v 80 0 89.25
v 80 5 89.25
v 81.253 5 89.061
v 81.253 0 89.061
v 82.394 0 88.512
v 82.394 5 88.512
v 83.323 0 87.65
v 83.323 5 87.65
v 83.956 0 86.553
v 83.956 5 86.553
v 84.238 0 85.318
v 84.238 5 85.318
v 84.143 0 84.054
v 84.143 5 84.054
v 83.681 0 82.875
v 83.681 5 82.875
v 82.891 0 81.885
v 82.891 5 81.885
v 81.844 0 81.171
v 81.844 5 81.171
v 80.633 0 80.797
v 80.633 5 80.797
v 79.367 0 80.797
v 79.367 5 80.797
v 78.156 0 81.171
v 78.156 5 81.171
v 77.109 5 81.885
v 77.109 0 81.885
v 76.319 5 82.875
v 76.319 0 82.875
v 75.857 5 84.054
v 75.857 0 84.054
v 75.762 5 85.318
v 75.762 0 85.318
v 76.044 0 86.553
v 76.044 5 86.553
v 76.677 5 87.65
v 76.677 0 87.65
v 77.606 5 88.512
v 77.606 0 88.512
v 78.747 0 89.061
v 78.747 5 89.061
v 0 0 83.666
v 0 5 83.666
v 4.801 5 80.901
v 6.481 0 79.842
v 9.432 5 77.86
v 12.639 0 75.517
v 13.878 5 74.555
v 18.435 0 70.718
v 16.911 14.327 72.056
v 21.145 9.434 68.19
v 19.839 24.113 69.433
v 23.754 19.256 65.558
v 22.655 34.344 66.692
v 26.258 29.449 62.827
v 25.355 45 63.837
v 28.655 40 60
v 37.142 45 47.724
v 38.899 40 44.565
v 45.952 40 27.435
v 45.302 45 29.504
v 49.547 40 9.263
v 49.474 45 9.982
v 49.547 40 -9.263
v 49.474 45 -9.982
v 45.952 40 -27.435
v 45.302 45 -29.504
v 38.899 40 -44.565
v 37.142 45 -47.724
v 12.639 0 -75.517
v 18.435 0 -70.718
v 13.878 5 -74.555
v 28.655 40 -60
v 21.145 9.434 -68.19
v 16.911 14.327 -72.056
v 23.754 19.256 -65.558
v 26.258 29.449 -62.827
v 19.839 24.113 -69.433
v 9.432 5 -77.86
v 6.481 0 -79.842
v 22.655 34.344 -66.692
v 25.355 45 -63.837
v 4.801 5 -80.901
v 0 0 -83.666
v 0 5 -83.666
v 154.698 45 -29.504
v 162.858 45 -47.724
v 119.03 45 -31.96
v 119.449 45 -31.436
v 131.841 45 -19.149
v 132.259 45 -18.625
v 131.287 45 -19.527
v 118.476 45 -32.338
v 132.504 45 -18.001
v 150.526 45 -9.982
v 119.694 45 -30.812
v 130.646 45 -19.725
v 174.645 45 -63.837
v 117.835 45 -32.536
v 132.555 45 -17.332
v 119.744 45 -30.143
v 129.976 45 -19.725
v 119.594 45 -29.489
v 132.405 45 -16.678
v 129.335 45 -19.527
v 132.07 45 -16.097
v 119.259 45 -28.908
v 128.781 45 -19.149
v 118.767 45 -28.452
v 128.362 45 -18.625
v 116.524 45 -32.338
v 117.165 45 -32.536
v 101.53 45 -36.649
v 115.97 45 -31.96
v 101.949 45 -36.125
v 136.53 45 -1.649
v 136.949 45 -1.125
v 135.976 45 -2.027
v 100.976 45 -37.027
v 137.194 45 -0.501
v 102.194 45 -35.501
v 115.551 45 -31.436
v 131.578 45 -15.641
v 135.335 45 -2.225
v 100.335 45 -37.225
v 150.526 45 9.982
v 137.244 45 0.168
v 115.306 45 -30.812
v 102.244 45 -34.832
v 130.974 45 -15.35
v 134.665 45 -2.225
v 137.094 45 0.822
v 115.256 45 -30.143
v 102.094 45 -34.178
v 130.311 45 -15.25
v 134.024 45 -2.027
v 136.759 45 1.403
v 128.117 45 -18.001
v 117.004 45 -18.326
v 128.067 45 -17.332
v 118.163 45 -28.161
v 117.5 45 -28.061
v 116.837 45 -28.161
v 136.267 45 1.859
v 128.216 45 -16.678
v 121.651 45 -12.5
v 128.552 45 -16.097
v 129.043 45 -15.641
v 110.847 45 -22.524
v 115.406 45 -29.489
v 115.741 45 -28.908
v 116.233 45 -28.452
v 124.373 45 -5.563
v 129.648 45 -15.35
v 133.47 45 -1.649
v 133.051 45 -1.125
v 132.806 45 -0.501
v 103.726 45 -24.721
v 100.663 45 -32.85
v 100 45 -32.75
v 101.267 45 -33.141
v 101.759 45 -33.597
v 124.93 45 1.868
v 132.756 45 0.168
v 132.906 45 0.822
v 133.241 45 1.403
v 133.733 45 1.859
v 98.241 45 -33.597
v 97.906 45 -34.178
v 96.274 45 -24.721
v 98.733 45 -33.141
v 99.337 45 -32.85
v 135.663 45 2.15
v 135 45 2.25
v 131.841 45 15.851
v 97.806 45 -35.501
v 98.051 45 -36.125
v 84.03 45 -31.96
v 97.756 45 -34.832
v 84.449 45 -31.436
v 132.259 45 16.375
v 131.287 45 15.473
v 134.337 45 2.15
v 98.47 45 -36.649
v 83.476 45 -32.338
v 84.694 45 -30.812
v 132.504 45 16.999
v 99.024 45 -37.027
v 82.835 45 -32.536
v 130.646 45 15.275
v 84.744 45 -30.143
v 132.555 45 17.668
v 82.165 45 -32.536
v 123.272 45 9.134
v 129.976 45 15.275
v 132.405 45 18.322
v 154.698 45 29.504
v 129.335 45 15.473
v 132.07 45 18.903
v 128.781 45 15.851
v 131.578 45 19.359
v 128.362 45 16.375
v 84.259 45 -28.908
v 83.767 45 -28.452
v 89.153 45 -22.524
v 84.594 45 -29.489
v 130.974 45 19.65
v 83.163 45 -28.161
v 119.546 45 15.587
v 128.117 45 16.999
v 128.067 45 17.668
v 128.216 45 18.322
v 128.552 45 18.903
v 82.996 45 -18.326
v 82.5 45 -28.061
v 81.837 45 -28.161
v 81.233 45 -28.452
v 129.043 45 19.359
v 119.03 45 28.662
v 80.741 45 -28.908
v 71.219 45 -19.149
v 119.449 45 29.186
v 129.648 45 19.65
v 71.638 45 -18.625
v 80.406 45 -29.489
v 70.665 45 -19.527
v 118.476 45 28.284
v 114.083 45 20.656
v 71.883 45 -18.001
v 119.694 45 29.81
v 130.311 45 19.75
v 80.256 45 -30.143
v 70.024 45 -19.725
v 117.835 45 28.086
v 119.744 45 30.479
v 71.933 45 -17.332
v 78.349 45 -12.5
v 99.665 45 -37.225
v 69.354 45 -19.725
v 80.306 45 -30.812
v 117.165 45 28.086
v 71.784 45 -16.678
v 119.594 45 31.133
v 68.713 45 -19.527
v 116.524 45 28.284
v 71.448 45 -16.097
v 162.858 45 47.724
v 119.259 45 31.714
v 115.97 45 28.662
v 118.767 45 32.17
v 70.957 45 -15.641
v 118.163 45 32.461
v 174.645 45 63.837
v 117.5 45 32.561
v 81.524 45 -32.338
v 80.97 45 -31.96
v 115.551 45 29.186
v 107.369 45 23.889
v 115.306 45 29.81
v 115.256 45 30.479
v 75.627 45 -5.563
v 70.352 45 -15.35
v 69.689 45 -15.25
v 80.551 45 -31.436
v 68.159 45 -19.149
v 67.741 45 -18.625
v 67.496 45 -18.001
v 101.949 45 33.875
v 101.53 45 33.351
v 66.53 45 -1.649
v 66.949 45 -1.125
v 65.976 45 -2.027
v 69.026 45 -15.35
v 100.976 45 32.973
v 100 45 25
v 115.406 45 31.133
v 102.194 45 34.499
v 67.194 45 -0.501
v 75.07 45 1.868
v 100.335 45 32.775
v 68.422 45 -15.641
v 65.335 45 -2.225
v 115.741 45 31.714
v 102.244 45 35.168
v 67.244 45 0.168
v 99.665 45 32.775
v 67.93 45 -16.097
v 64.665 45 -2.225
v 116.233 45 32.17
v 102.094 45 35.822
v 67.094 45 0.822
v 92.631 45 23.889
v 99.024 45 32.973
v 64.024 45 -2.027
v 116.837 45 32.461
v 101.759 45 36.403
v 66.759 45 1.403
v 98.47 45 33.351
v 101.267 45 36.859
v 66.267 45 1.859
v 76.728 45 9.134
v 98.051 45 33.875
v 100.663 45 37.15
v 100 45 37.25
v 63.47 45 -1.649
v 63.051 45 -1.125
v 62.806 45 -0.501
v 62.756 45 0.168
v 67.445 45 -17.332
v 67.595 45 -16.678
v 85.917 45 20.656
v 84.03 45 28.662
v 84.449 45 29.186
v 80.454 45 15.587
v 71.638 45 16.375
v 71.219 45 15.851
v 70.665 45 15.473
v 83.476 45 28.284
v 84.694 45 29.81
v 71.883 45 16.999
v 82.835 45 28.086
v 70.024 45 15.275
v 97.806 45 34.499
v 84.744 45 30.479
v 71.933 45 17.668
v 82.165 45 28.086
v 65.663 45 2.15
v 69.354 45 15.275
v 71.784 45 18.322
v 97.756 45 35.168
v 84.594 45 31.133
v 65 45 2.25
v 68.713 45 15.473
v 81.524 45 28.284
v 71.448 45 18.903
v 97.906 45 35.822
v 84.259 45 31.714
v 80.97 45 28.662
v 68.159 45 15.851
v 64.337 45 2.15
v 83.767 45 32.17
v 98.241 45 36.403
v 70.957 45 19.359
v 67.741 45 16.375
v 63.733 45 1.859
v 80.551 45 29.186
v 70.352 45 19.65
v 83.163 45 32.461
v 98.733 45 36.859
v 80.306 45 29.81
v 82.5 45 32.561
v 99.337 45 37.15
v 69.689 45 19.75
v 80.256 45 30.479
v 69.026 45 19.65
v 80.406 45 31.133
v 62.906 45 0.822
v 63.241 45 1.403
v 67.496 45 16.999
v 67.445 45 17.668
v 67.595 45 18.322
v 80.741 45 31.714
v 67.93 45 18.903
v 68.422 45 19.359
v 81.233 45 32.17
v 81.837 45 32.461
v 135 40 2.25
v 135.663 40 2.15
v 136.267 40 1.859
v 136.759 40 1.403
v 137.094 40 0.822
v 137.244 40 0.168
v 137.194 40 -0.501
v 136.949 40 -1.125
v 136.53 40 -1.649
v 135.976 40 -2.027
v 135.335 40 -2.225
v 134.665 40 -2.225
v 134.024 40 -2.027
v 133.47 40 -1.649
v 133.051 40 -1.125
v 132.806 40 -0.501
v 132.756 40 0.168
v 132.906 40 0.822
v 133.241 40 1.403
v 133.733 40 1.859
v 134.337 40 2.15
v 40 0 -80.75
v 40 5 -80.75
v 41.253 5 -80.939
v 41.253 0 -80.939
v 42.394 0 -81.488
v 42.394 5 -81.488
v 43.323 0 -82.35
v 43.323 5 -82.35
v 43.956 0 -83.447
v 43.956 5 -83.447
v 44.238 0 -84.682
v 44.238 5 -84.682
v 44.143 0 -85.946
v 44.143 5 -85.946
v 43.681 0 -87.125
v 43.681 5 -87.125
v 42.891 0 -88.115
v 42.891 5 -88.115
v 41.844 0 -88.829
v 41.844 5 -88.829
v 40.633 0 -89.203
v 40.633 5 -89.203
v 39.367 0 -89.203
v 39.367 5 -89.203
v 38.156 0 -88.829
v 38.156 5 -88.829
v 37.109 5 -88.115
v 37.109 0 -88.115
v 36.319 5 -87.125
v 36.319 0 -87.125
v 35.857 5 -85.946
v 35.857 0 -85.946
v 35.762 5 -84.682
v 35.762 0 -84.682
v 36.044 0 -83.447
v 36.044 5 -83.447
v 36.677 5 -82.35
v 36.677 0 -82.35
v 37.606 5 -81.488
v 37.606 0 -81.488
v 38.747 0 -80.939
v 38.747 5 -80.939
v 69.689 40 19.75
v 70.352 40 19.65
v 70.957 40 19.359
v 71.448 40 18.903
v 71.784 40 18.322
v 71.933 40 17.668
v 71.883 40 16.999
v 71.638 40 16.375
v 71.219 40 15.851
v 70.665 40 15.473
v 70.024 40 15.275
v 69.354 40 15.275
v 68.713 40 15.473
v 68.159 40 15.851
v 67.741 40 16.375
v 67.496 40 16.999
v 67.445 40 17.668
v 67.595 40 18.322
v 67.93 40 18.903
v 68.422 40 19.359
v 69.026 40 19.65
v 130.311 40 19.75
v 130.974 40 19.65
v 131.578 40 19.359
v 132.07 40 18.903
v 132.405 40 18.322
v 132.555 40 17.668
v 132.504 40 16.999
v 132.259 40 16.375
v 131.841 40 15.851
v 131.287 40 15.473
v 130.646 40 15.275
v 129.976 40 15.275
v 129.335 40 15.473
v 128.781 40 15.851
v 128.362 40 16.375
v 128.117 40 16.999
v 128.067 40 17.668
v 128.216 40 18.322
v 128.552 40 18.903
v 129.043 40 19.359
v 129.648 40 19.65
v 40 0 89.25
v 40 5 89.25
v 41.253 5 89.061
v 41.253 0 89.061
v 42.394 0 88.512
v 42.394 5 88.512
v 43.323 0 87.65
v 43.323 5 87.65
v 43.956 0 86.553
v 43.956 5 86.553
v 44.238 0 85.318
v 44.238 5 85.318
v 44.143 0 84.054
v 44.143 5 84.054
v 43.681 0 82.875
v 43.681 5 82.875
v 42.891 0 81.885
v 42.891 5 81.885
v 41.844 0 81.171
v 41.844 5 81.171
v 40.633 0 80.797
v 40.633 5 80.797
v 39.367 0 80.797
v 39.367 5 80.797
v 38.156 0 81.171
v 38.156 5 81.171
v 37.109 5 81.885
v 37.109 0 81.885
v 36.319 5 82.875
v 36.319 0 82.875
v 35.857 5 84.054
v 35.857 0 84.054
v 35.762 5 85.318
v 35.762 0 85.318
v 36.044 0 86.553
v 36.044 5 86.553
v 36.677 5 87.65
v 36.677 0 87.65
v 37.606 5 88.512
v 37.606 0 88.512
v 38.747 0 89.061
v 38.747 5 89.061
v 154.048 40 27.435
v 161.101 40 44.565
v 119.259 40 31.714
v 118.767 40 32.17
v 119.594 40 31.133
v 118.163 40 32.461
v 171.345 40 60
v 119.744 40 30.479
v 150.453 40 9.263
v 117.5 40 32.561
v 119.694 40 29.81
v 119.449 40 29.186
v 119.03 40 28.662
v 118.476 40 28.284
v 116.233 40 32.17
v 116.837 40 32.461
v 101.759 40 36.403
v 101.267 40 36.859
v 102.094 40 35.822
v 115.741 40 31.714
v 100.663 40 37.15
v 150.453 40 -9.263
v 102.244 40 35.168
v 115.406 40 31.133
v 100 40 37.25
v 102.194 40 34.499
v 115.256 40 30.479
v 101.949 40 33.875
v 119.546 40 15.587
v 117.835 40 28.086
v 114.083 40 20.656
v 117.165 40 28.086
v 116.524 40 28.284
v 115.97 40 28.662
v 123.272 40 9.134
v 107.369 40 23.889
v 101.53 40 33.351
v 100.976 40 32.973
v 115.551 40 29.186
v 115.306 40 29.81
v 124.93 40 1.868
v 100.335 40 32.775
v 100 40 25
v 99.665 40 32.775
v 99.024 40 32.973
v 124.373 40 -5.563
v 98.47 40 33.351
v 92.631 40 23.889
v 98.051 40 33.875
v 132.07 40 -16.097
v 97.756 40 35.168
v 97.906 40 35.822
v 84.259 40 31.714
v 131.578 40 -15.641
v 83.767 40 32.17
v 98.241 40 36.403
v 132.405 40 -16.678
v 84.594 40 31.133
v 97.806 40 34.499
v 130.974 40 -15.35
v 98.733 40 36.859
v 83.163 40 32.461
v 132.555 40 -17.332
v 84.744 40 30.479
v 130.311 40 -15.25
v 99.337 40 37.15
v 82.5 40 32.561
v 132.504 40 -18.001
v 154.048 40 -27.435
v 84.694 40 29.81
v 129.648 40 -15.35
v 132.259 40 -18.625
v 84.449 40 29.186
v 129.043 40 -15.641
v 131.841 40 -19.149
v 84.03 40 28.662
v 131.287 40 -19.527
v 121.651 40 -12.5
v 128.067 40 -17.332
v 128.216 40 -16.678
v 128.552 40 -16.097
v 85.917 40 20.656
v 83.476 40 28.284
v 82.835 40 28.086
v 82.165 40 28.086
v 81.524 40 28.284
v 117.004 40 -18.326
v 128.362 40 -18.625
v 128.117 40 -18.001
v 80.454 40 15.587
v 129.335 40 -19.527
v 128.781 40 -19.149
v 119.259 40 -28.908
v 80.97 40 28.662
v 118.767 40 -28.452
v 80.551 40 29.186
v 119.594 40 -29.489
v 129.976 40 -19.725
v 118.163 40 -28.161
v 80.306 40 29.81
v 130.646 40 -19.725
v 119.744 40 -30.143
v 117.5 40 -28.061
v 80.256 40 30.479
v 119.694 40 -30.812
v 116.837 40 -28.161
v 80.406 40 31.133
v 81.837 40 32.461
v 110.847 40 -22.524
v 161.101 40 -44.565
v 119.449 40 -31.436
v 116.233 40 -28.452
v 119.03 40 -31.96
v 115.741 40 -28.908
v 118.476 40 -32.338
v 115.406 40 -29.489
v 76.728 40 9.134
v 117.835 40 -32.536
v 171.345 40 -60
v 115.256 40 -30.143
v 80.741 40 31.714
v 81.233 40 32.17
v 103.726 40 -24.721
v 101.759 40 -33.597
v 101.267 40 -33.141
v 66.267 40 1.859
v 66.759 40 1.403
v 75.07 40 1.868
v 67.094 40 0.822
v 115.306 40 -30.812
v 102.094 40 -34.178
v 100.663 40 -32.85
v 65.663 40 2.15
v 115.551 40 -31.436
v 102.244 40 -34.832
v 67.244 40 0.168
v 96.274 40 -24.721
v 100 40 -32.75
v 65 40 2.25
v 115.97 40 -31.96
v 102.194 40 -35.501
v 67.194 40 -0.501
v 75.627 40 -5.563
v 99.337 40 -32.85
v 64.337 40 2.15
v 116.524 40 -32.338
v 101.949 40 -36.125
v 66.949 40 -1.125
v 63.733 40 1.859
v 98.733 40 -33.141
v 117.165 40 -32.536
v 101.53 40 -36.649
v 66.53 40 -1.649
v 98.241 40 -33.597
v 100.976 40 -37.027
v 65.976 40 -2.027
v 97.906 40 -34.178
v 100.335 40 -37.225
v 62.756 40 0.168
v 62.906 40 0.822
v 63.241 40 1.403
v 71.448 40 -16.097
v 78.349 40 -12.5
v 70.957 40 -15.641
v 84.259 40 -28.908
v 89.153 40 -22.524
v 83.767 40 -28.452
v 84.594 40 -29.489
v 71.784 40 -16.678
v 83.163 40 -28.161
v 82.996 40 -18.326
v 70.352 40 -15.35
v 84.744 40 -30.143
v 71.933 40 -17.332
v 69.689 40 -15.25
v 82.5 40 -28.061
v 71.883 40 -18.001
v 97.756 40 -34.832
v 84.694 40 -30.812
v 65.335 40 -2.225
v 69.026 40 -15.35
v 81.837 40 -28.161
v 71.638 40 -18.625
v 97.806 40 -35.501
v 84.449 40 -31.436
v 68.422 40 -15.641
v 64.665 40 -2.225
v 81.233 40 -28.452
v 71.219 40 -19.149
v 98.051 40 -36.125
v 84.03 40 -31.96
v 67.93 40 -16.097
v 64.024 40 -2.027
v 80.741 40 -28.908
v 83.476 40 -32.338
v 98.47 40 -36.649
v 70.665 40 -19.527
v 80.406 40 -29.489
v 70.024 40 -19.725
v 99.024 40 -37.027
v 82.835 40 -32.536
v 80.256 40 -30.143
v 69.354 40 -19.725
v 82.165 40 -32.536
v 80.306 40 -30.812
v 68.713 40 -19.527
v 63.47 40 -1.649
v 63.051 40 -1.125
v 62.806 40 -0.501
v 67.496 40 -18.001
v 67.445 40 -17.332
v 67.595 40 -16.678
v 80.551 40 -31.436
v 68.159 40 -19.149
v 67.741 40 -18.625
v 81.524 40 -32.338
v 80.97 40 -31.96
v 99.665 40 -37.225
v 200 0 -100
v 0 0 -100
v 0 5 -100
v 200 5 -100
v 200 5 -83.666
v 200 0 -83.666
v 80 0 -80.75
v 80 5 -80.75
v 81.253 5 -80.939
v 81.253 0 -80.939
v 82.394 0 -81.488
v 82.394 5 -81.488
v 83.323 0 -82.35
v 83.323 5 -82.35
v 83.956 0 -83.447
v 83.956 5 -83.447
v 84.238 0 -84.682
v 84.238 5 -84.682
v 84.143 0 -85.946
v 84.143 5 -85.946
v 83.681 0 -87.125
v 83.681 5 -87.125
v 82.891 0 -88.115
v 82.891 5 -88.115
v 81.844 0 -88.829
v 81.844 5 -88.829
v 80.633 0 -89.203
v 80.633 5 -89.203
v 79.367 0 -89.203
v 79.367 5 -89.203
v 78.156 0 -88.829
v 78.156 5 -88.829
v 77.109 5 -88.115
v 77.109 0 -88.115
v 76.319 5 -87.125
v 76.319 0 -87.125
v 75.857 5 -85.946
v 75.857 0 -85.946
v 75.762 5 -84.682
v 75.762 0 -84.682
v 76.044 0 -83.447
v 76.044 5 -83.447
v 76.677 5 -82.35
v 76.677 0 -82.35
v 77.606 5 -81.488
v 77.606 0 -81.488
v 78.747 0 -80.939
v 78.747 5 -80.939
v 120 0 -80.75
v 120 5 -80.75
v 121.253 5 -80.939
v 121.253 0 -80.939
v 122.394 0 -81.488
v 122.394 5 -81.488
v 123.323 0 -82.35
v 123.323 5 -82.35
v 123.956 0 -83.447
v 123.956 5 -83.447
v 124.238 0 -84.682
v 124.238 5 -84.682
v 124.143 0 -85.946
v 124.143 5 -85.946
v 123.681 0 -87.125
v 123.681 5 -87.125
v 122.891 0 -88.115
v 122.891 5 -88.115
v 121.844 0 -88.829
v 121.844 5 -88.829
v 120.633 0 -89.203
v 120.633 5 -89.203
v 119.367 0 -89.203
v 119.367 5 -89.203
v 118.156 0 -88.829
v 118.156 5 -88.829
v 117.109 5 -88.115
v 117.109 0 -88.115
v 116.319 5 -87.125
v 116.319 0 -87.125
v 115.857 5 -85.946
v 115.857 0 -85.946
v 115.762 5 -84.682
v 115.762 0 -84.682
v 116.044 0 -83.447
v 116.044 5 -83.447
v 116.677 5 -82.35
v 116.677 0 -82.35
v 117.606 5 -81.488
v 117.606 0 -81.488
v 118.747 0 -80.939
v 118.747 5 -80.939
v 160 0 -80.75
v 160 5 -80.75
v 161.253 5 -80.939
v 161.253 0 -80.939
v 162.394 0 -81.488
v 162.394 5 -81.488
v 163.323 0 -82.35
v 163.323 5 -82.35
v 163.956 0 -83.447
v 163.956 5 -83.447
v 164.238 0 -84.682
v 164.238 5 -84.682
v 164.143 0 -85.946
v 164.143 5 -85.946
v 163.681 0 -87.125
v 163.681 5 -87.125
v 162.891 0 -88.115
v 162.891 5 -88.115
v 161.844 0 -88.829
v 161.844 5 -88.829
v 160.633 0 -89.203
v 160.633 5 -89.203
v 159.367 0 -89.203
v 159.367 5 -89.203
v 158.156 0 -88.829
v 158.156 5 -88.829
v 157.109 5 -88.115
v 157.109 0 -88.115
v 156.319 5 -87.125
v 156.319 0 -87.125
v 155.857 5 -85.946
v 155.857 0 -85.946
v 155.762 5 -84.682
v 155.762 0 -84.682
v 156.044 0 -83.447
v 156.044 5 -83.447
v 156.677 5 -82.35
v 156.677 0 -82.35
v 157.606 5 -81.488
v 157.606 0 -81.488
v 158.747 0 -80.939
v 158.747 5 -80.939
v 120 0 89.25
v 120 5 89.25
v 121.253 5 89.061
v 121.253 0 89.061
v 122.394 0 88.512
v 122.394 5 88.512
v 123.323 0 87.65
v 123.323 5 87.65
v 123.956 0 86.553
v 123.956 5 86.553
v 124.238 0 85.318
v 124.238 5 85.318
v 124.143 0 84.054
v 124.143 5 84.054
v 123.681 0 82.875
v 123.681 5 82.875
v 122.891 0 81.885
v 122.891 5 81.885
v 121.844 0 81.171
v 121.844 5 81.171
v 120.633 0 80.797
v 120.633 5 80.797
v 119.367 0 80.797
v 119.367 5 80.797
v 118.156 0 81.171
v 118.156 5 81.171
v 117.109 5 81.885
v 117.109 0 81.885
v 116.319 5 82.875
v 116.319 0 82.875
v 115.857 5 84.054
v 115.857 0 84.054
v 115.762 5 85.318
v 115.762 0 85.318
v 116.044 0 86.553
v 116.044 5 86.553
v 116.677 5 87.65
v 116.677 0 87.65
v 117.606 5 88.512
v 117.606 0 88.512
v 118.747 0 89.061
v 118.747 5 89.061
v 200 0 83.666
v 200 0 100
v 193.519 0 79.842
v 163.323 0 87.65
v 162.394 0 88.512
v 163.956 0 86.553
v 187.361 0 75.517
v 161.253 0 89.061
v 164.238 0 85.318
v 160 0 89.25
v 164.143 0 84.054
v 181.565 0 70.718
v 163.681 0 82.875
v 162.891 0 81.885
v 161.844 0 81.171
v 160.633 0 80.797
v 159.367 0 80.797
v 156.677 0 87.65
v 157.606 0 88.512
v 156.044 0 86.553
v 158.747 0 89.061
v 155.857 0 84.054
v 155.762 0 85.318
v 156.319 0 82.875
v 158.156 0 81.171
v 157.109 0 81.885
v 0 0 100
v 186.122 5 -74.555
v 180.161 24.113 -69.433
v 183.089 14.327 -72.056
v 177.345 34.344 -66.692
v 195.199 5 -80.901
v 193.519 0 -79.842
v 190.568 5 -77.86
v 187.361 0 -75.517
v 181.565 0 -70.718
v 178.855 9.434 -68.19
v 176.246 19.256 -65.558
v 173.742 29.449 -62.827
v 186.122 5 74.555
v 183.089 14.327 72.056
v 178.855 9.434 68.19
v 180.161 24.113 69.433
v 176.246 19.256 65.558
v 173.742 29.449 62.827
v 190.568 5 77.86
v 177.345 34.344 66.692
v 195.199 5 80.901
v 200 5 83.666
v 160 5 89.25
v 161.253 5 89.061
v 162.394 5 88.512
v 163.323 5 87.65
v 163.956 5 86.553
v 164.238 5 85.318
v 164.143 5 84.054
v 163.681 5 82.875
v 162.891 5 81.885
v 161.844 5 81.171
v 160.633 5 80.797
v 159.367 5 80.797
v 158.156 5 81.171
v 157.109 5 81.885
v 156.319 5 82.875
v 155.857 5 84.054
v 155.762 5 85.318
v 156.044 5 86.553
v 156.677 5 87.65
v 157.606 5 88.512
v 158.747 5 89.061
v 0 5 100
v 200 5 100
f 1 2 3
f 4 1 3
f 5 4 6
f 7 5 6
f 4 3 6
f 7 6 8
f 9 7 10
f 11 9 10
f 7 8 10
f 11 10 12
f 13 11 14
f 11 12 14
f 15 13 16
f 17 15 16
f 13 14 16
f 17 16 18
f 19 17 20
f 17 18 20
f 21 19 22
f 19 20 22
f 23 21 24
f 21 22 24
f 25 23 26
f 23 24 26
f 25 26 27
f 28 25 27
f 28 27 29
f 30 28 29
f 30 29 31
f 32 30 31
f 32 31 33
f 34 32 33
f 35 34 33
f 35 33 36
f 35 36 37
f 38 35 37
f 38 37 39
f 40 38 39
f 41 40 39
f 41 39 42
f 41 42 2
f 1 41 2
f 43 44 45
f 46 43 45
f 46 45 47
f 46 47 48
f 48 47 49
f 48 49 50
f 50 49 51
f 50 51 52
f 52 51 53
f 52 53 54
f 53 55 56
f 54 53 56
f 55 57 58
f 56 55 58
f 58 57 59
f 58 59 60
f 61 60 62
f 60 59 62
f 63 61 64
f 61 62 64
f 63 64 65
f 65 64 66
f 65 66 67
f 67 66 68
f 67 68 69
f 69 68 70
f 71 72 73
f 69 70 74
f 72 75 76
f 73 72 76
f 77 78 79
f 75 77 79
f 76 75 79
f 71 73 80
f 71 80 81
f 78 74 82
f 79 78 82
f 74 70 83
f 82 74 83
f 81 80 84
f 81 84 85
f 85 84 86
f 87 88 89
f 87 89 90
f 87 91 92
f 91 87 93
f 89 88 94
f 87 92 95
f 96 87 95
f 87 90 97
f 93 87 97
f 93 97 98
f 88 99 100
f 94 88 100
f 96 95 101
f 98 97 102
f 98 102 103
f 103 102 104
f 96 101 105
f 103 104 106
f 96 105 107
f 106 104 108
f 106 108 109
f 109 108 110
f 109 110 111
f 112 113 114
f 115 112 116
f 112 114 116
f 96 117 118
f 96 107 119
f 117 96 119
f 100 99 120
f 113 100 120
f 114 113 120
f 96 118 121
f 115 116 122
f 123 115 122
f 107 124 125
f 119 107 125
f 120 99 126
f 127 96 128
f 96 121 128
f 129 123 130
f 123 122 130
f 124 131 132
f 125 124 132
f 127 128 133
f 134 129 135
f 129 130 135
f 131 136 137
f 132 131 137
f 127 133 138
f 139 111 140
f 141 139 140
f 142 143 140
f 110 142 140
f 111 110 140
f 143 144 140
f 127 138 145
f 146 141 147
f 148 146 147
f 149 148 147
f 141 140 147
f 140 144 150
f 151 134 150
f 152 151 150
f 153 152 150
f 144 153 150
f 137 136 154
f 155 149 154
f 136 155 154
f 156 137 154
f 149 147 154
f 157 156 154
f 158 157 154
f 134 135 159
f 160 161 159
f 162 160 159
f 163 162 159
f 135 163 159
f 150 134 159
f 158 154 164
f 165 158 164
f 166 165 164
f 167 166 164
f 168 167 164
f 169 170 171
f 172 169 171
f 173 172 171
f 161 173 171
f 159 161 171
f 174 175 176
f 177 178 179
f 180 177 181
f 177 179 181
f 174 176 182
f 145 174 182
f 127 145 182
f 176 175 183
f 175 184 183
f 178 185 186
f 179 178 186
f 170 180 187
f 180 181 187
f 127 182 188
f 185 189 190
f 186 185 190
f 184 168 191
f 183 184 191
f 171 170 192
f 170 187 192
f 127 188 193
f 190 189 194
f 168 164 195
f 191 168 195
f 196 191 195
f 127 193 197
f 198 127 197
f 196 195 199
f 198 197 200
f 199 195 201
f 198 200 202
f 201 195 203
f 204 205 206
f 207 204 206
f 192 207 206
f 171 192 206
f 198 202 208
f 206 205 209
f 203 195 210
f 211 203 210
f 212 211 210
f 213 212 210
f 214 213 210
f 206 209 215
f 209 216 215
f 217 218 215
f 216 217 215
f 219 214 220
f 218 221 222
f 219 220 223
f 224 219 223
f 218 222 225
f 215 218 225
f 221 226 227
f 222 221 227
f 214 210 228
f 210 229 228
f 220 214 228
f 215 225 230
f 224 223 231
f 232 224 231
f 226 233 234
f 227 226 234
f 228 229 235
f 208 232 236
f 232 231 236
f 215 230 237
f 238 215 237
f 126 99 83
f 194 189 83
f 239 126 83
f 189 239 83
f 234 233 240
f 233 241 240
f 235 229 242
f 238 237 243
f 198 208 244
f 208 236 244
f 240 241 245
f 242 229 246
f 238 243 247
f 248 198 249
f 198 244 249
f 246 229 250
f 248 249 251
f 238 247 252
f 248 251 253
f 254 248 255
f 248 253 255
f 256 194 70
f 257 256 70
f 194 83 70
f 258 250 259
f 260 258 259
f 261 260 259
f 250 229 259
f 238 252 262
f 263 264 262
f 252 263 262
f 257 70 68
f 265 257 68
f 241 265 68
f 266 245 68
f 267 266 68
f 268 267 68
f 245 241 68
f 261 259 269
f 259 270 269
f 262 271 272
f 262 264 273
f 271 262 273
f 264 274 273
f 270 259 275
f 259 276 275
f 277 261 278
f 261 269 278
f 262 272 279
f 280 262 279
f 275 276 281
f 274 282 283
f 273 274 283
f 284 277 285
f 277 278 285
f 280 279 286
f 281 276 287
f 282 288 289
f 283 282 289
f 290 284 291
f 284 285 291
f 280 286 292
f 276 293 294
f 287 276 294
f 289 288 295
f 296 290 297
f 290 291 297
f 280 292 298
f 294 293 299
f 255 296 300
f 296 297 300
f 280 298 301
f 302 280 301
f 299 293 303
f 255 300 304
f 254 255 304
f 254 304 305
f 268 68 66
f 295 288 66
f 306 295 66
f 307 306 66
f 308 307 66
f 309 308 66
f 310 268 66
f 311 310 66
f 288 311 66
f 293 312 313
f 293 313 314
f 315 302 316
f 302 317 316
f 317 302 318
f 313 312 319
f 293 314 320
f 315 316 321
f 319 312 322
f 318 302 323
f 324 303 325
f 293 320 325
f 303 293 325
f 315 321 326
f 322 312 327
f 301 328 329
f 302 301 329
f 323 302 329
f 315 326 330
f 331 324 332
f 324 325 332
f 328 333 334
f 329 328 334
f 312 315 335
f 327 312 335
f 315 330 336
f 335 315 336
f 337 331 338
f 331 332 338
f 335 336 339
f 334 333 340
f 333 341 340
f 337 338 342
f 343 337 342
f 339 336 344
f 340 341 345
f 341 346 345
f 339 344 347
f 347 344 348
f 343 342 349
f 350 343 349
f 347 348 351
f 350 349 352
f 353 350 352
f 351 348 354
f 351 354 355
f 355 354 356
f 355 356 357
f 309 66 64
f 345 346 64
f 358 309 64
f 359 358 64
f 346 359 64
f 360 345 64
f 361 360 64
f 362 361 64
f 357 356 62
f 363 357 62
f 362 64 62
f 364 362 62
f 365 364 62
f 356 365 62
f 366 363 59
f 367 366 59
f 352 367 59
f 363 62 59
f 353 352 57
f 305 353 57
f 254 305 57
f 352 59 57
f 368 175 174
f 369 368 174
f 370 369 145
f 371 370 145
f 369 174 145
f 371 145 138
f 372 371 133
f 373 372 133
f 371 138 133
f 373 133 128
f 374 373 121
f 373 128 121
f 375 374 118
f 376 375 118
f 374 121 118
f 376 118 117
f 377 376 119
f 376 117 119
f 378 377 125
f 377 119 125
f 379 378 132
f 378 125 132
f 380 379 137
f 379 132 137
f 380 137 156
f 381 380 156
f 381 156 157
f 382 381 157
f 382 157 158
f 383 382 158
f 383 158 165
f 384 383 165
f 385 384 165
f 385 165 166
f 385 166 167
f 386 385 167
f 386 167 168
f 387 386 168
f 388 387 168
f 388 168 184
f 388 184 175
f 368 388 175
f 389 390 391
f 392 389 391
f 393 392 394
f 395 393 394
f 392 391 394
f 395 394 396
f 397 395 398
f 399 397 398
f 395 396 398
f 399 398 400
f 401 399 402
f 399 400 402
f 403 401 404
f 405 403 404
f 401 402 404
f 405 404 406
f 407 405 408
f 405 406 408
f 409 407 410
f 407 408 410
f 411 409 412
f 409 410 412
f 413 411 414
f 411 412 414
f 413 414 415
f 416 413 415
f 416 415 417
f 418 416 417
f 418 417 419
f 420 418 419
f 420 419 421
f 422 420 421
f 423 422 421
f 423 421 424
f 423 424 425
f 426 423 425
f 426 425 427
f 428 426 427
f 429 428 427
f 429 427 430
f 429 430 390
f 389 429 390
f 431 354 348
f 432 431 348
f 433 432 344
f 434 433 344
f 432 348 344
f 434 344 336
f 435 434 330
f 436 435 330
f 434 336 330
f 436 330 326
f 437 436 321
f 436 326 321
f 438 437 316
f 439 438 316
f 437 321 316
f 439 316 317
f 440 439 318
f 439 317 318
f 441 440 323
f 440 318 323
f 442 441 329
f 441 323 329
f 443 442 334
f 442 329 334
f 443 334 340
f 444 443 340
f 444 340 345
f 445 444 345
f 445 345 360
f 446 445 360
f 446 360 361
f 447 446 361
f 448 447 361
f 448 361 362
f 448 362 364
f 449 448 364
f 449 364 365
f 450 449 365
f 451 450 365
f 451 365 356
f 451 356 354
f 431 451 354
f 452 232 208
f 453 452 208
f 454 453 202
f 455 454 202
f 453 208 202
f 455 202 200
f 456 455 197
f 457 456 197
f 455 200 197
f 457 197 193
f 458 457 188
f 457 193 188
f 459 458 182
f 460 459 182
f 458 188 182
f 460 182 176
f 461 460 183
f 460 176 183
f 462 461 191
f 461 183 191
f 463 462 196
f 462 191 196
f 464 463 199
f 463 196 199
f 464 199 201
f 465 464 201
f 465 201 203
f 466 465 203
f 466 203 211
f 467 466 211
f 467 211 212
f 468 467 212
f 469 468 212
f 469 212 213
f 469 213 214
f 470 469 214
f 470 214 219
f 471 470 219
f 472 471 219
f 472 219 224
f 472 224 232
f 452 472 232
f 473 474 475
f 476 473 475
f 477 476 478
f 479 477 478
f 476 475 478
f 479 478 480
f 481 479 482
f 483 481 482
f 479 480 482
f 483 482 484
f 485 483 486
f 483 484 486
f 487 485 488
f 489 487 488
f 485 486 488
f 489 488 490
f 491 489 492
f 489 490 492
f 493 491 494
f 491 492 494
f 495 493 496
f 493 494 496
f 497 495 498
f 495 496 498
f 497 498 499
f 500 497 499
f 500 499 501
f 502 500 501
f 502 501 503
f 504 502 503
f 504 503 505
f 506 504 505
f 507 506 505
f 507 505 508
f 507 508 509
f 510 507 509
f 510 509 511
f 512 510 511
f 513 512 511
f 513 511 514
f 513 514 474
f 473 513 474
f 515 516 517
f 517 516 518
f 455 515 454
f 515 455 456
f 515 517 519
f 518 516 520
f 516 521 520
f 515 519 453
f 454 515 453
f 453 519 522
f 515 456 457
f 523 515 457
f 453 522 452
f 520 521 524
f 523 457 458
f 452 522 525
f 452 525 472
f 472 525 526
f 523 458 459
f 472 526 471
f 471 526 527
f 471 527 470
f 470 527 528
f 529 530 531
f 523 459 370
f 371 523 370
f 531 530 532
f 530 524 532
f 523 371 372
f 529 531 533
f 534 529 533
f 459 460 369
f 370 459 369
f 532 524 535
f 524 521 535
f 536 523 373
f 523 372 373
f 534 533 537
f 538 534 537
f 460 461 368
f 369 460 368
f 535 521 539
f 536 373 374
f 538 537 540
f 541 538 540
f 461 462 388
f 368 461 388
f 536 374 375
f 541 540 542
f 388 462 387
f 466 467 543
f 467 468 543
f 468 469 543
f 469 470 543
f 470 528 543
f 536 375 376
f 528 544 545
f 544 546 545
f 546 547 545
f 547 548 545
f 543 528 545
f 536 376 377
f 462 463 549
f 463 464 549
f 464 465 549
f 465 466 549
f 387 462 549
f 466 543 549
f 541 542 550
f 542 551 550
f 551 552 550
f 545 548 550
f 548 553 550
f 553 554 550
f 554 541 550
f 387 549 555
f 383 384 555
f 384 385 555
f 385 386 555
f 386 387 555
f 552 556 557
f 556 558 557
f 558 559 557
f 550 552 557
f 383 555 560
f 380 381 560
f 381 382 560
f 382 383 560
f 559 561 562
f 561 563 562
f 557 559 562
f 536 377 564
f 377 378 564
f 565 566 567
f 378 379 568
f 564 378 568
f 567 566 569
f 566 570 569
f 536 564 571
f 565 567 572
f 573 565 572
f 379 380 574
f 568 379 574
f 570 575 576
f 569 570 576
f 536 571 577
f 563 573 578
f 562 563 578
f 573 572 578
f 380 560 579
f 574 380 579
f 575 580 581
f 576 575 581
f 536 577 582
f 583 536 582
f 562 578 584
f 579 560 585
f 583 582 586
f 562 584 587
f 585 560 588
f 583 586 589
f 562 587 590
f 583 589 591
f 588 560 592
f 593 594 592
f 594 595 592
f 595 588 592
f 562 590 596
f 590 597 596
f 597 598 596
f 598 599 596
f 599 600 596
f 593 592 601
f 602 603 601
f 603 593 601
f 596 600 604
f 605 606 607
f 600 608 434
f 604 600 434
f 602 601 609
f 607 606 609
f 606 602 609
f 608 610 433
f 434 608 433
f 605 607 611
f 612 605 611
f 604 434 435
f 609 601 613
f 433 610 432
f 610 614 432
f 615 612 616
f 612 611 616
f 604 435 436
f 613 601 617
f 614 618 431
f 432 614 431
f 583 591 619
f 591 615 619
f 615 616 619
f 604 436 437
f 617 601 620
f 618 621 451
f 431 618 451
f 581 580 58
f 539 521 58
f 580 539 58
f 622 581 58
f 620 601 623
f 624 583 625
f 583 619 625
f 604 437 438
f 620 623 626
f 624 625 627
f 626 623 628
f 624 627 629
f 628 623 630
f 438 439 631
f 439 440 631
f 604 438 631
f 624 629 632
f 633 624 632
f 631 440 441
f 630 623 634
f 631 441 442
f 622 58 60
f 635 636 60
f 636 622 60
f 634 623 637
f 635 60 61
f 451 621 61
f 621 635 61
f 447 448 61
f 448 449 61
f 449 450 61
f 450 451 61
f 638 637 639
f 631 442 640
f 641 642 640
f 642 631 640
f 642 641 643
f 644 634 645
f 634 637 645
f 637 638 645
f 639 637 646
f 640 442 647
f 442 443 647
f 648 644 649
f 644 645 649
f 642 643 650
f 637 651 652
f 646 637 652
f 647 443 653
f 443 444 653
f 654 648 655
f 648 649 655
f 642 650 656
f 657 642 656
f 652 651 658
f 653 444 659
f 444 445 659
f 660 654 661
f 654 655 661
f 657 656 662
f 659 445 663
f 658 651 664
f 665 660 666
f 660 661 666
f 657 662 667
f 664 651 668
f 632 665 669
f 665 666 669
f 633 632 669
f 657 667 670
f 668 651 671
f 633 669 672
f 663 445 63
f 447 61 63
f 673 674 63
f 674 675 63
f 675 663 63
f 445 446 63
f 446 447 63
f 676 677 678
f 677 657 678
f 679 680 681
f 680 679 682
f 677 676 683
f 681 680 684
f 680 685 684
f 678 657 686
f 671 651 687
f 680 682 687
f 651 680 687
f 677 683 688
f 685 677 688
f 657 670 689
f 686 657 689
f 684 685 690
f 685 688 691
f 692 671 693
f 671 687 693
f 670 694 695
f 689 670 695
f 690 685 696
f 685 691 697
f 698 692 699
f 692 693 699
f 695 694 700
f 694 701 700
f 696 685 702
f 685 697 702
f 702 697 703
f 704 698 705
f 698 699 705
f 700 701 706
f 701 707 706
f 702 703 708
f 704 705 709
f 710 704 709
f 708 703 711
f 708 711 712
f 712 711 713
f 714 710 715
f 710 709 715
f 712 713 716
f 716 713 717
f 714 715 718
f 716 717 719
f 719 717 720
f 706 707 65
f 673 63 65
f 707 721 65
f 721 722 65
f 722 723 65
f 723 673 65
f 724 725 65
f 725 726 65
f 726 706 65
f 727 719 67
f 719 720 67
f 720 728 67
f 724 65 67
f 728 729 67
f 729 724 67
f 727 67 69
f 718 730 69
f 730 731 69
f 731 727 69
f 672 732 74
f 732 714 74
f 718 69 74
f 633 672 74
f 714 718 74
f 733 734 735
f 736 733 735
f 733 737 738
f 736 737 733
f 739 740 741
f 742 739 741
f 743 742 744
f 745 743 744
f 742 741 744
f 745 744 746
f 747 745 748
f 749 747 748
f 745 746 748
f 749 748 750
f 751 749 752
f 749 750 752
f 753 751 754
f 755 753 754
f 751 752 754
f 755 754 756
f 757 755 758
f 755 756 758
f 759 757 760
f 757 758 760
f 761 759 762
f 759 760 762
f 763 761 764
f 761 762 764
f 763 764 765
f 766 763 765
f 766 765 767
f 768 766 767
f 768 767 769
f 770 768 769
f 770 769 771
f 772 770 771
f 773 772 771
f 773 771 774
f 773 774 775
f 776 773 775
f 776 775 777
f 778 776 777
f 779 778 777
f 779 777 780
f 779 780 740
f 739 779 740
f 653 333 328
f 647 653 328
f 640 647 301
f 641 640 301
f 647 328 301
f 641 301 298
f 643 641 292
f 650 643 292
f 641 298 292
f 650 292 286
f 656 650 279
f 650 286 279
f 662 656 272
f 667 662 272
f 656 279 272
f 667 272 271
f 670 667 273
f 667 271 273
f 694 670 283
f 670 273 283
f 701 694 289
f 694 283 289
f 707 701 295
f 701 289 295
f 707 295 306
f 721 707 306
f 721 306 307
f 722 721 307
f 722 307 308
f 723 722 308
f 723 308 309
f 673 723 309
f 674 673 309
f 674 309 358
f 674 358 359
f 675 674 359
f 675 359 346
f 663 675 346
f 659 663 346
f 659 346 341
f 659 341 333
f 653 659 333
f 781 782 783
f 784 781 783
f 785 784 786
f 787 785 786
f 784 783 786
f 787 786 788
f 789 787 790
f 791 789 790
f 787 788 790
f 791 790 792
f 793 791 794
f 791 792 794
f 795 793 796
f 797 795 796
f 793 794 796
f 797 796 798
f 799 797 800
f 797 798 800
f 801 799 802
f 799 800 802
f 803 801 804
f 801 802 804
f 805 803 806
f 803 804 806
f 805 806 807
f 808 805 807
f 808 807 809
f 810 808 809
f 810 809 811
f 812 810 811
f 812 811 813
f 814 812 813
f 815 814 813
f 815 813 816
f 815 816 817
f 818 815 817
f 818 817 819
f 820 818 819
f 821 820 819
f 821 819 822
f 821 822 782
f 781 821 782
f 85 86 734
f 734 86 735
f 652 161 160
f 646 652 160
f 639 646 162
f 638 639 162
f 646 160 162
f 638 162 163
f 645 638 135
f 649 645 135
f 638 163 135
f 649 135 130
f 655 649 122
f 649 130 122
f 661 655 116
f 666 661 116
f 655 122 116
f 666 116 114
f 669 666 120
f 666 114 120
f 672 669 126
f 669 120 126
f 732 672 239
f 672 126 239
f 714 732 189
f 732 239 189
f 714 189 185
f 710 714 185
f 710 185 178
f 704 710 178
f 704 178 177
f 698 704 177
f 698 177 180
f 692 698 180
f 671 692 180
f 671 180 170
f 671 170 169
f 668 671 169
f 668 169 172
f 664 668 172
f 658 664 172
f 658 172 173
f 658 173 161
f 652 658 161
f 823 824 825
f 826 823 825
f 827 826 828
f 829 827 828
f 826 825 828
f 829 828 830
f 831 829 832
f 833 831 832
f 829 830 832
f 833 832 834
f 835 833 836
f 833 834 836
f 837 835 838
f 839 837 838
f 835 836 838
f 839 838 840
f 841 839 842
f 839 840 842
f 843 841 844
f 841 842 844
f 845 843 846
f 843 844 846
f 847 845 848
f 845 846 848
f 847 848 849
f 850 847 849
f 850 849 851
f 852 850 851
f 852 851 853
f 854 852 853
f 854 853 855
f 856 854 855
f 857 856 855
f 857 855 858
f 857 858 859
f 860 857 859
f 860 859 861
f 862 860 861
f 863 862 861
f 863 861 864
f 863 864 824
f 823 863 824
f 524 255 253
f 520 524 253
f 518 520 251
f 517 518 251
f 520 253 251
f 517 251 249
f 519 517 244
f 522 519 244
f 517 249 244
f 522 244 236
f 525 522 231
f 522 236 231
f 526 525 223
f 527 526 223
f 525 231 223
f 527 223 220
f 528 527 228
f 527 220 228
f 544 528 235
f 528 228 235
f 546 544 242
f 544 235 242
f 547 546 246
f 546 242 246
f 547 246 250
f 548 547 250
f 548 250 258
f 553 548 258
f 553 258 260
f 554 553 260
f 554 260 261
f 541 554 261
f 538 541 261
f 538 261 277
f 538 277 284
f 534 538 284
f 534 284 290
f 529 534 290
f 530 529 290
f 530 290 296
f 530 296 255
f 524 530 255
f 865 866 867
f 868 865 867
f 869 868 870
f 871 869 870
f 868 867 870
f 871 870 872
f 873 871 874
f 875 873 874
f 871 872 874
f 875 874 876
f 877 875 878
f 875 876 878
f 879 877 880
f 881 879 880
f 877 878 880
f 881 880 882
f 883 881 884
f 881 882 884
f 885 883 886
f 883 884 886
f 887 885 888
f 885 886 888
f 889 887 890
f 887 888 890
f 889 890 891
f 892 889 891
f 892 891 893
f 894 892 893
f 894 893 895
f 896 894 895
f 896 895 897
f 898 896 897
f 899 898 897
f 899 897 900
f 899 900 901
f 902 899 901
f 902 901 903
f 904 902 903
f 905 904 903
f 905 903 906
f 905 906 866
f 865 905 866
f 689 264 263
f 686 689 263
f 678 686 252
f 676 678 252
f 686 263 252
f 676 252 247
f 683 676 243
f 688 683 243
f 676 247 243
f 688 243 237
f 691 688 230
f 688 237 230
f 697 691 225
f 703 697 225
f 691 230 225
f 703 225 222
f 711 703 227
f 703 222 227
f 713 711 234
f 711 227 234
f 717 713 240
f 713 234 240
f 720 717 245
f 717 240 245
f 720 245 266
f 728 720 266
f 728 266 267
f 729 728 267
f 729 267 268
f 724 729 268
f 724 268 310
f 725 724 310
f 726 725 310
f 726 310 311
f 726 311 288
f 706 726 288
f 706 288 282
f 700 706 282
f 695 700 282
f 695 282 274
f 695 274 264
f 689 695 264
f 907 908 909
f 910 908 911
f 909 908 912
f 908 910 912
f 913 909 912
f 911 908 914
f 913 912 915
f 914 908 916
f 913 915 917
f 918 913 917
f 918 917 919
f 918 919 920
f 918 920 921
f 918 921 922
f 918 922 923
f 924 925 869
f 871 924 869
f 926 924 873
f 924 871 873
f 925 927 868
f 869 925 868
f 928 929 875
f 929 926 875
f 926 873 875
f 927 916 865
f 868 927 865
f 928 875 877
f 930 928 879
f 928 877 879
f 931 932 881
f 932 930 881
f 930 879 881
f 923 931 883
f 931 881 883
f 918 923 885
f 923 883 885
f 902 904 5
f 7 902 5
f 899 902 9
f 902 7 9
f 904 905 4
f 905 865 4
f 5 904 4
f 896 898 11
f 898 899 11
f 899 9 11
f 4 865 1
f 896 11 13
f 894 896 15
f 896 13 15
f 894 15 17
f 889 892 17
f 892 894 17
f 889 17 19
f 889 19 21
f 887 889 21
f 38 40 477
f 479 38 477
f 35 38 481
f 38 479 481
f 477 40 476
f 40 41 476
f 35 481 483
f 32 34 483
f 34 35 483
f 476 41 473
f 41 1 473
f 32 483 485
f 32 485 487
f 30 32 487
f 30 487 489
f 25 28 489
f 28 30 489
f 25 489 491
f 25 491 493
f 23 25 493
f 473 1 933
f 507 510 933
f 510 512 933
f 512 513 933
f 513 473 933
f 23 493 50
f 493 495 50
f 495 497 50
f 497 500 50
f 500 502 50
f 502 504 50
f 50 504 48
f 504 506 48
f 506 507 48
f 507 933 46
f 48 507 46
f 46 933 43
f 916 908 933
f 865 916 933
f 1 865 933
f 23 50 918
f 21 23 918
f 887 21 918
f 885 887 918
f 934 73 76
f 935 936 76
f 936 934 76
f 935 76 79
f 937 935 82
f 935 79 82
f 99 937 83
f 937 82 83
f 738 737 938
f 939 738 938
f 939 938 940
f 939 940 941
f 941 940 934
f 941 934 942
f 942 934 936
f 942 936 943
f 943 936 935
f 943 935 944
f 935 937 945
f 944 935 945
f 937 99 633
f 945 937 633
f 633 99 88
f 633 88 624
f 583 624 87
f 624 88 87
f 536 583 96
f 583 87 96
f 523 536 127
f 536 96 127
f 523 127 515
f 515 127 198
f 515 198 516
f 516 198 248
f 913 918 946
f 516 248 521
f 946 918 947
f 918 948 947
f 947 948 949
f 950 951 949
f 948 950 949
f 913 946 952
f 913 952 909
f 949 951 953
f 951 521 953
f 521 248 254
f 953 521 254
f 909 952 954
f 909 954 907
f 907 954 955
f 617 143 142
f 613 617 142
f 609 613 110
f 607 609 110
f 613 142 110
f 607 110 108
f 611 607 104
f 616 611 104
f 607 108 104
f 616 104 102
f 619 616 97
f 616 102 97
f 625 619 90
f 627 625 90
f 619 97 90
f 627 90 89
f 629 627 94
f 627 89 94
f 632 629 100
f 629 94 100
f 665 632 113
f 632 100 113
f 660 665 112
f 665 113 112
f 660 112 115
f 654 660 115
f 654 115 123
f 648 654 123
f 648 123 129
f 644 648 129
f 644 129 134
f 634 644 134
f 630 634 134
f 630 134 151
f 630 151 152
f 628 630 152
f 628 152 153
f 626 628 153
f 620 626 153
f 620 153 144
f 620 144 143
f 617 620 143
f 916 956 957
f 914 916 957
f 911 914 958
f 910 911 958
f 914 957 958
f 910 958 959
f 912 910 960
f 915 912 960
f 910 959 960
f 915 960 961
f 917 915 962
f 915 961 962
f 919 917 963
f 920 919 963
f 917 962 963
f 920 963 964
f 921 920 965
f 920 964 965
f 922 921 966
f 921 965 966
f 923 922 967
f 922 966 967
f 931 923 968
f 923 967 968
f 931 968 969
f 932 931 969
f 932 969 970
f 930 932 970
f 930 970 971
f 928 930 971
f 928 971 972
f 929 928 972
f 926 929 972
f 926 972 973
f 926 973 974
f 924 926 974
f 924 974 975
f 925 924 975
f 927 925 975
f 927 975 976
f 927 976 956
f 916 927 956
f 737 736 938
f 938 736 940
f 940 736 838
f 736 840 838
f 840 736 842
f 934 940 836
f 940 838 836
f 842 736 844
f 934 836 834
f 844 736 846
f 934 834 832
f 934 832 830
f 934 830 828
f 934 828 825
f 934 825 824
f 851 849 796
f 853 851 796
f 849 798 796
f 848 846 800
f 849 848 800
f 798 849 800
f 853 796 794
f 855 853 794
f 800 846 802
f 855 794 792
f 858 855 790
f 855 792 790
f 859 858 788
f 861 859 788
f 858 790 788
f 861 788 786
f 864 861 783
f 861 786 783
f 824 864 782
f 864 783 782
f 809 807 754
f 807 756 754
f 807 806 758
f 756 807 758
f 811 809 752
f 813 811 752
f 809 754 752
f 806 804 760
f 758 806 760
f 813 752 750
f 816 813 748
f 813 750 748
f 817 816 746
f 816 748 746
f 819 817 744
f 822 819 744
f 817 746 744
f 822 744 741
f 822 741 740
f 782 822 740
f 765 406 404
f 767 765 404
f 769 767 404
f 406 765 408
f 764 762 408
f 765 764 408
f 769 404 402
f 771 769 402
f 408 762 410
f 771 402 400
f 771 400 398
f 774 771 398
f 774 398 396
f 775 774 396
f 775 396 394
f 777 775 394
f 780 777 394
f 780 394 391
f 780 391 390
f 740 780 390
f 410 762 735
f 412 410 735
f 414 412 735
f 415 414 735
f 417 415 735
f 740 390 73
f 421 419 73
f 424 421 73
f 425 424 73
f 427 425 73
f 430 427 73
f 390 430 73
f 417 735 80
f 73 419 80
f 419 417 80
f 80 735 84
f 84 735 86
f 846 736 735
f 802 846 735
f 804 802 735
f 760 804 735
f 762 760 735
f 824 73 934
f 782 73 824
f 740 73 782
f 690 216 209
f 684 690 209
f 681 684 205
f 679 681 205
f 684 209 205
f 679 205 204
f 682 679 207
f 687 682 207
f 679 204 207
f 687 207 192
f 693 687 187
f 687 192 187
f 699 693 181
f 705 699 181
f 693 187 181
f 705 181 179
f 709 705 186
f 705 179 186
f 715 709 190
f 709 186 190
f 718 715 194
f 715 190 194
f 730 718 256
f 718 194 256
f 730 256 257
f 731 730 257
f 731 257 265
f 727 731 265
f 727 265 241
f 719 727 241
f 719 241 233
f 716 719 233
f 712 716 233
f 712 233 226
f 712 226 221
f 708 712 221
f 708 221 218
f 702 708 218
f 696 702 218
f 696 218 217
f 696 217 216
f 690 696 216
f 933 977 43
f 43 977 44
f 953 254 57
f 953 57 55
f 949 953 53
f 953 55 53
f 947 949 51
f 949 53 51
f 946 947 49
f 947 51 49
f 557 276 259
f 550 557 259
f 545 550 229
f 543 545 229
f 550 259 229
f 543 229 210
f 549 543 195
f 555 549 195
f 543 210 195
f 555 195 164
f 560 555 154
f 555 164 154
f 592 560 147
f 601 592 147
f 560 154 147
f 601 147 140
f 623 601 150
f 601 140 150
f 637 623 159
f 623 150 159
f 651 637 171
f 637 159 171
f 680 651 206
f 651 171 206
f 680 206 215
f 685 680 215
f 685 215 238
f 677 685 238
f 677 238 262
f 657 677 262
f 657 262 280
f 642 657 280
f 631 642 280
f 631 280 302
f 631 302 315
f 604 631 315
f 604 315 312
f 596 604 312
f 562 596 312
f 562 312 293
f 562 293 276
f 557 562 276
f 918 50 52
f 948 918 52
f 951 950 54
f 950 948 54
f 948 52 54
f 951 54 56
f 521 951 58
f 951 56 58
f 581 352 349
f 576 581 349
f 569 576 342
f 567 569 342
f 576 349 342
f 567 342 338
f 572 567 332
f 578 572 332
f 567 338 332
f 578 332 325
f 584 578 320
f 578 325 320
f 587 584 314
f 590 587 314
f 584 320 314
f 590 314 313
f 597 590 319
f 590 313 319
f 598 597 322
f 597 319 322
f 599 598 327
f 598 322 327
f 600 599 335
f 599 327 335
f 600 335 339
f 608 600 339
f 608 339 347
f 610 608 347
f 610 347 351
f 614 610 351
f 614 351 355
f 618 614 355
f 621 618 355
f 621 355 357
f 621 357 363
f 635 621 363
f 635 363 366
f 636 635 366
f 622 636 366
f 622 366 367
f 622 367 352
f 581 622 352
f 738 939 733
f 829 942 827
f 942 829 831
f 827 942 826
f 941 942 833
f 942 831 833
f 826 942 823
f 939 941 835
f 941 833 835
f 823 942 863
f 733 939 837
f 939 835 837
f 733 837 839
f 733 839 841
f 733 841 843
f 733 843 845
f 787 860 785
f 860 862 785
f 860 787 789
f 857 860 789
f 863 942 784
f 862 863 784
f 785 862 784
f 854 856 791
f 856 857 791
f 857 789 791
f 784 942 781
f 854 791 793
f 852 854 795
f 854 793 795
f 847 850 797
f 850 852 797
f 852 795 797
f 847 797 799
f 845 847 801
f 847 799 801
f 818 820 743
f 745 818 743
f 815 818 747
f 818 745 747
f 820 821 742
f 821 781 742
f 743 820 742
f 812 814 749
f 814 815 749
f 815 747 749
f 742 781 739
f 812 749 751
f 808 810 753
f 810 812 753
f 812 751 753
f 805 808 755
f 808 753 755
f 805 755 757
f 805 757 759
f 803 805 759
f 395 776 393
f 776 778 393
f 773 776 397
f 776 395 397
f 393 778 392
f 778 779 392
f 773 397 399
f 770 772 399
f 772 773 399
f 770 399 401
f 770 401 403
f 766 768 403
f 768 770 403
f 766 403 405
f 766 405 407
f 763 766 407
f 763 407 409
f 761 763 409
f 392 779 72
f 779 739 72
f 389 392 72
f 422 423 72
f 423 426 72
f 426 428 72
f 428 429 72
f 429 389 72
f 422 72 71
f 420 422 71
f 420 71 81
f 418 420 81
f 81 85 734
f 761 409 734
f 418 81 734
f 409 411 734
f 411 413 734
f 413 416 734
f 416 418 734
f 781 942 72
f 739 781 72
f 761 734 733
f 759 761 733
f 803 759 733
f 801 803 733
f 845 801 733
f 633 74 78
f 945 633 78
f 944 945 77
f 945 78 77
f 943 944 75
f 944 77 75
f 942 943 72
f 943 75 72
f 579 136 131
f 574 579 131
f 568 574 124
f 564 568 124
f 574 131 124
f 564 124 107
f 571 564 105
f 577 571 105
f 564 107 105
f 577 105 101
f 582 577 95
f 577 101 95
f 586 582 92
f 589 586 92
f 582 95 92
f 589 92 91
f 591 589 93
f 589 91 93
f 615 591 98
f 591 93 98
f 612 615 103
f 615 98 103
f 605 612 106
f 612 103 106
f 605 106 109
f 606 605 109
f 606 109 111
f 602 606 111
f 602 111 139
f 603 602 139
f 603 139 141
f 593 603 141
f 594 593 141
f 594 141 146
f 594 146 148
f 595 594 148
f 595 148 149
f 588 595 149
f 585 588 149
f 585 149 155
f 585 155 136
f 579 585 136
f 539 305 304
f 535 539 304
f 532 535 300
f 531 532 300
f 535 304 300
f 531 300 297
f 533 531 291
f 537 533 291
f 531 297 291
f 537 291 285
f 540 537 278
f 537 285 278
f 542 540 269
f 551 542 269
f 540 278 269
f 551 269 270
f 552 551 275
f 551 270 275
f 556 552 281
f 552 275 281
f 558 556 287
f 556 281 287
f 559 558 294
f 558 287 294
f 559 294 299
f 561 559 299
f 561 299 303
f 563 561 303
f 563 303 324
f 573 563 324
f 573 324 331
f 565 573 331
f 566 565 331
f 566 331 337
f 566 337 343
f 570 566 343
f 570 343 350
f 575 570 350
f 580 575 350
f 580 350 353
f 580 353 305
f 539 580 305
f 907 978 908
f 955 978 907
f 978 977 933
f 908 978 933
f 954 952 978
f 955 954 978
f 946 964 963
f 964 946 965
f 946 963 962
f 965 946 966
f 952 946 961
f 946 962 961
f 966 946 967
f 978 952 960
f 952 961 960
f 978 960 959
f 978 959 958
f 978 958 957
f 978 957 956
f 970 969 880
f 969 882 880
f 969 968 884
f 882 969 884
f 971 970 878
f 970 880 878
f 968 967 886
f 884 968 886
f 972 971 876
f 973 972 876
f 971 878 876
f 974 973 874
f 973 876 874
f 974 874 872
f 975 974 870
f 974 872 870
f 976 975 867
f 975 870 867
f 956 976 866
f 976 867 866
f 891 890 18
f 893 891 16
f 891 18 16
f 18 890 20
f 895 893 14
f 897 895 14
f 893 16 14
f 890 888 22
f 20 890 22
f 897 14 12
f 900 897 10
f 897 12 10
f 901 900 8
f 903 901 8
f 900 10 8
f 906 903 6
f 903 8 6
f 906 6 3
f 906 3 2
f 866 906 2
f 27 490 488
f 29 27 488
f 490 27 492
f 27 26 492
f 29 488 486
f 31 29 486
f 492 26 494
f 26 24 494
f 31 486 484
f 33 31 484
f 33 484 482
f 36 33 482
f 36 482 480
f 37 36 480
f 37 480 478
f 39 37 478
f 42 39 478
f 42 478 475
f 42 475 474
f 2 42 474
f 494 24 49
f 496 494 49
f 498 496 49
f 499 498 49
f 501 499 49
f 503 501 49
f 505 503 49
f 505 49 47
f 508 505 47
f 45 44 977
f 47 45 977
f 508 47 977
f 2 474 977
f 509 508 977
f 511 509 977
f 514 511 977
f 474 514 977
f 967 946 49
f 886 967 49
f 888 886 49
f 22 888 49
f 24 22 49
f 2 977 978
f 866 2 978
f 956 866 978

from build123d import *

# Parameters (mm, degrees)
EXTRUDE_1_DEPTH     = 200
SKETCH_2_R          = 95
CUT_EXTRUDE_1_DEPTH = 150
SKETCH_3_R          = 4.25
CUT_EXTRUDE_2_DEPTH = 150
SKETCH_4_R          = 2.25
SKETCH_4_R_2        = 25
CUT_EXTRUDE_3_DEPTH = 10


with BuildPart() as part:
    # 草图1 → 凸台-拉伸1 (new body)
    with BuildSketch(Plane(origin=(0, 0, 0), x_dir=(0, 0, -1), z_dir=(1, 0, 0))):
        Polygon((-100, 0), (-70.717967697, 0), (-60, 40), (60, 40), (70.717967697, 0), (100, 0), (100, 5), (74.554602637, 5), (63.83663494, 45), (-63.83663494, 45), (-74.554602637, 5), (-100, 5), align=None)
    extrude(amount=EXTRUDE_1_DEPTH)

    # 草图2 → 切除-拉伸1 (cut)
    with BuildSketch(Plane(origin=(0, 45, 0), x_dir=(1, 0, 0), z_dir=(0, 1, 0))):
        with Locations((245, 0)):
            Circle(SKETCH_2_R)
        with Locations((-45, 0)):
            Circle(SKETCH_2_R)
    extrude(amount=-CUT_EXTRUDE_1_DEPTH, mode=Mode.SUBTRACT)

    # 草图3 → 切除-拉伸2 (cut)
    with BuildSketch(Plane(origin=(0, 5, 0), x_dir=(1, 0, 0), z_dir=(0, 1, 0))):
        with Locations(Location((120, -85, 0), (0, 0, 270))):
            Circle(SKETCH_3_R)
        with Locations(Location((160, -85, 0), (0, 0, 270))):
            Circle(SKETCH_3_R)
        with Locations(Location((40, -85, 0), (0, 0, 270))):
            Circle(SKETCH_3_R)
        with Locations(Location((80, -85, 0), (0, 0, 270))):
            Circle(SKETCH_3_R)
        with Locations(Location((160, 85, 0), (0, 0, 270))):
            Circle(SKETCH_3_R)
        with Locations(Location((120, 85, 0), (0, 0, 270))):
            Circle(SKETCH_3_R)
        with Locations(Location((80, 85, 0), (0, 0, 270))):
            Circle(SKETCH_3_R)
        with Locations(Location((40, 85, 0), (0, 0, 270))):
            Circle(SKETCH_3_R)
    extrude(amount=-CUT_EXTRUDE_2_DEPTH, mode=Mode.SUBTRACT)

    # 草图4 → 切除-拉伸3 (cut)
    with BuildSketch(Plane(origin=(0, 45, 0), x_dir=(1, 0, 0), z_dir=(0, 1, 0))):
        with Locations(Location((100, 35, 0), (0, 0, 270))):
            Circle(SKETCH_4_R)
        with Locations(Location((117.5, 30.310889132, 0), (0, 0, 270))):
            Circle(SKETCH_4_R)
        with Locations(Location((130.310889132, 17.5, 0), (0, 0, 270))):
            Circle(SKETCH_4_R)
        with Locations(Location((135, 0, 0), (0, 0, 270))):
            Circle(SKETCH_4_R)
        with Locations(Location((130.310889132, -17.5, 0), (0, 0, 270))):
            Circle(SKETCH_4_R)
        with Locations(Location((117.5, -30.310889132, 0), (0, 0, 270))):
            Circle(SKETCH_4_R)
        with Locations(Location((100, -35, 0), (0, 0, 270))):
            Circle(SKETCH_4_R)
        with Locations(Location((82.5, -30.310889132, 0), (0, 0, 270))):
            Circle(SKETCH_4_R)
        with Locations(Location((69.689110868, -17.5, 0), (0, 0, 270))):
            Circle(SKETCH_4_R)
        with Locations(Location((65, 0, 0), (0, 0, 270))):
            Circle(SKETCH_4_R)
        with Locations(Location((69.689110868, 17.5, 0), (0, 0, 270))):
            Circle(SKETCH_4_R)
        with Locations(Location((82.5, 30.310889132, 0), (0, 0, 270))):
            Circle(SKETCH_4_R)
        with Locations(Location((100, 0, 0), (0, 0, 270))):
            Circle(SKETCH_4_R_2)
    extrude(amount=-CUT_EXTRUDE_3_DEPTH, mode=Mode.SUBTRACT)


solid = part.part
